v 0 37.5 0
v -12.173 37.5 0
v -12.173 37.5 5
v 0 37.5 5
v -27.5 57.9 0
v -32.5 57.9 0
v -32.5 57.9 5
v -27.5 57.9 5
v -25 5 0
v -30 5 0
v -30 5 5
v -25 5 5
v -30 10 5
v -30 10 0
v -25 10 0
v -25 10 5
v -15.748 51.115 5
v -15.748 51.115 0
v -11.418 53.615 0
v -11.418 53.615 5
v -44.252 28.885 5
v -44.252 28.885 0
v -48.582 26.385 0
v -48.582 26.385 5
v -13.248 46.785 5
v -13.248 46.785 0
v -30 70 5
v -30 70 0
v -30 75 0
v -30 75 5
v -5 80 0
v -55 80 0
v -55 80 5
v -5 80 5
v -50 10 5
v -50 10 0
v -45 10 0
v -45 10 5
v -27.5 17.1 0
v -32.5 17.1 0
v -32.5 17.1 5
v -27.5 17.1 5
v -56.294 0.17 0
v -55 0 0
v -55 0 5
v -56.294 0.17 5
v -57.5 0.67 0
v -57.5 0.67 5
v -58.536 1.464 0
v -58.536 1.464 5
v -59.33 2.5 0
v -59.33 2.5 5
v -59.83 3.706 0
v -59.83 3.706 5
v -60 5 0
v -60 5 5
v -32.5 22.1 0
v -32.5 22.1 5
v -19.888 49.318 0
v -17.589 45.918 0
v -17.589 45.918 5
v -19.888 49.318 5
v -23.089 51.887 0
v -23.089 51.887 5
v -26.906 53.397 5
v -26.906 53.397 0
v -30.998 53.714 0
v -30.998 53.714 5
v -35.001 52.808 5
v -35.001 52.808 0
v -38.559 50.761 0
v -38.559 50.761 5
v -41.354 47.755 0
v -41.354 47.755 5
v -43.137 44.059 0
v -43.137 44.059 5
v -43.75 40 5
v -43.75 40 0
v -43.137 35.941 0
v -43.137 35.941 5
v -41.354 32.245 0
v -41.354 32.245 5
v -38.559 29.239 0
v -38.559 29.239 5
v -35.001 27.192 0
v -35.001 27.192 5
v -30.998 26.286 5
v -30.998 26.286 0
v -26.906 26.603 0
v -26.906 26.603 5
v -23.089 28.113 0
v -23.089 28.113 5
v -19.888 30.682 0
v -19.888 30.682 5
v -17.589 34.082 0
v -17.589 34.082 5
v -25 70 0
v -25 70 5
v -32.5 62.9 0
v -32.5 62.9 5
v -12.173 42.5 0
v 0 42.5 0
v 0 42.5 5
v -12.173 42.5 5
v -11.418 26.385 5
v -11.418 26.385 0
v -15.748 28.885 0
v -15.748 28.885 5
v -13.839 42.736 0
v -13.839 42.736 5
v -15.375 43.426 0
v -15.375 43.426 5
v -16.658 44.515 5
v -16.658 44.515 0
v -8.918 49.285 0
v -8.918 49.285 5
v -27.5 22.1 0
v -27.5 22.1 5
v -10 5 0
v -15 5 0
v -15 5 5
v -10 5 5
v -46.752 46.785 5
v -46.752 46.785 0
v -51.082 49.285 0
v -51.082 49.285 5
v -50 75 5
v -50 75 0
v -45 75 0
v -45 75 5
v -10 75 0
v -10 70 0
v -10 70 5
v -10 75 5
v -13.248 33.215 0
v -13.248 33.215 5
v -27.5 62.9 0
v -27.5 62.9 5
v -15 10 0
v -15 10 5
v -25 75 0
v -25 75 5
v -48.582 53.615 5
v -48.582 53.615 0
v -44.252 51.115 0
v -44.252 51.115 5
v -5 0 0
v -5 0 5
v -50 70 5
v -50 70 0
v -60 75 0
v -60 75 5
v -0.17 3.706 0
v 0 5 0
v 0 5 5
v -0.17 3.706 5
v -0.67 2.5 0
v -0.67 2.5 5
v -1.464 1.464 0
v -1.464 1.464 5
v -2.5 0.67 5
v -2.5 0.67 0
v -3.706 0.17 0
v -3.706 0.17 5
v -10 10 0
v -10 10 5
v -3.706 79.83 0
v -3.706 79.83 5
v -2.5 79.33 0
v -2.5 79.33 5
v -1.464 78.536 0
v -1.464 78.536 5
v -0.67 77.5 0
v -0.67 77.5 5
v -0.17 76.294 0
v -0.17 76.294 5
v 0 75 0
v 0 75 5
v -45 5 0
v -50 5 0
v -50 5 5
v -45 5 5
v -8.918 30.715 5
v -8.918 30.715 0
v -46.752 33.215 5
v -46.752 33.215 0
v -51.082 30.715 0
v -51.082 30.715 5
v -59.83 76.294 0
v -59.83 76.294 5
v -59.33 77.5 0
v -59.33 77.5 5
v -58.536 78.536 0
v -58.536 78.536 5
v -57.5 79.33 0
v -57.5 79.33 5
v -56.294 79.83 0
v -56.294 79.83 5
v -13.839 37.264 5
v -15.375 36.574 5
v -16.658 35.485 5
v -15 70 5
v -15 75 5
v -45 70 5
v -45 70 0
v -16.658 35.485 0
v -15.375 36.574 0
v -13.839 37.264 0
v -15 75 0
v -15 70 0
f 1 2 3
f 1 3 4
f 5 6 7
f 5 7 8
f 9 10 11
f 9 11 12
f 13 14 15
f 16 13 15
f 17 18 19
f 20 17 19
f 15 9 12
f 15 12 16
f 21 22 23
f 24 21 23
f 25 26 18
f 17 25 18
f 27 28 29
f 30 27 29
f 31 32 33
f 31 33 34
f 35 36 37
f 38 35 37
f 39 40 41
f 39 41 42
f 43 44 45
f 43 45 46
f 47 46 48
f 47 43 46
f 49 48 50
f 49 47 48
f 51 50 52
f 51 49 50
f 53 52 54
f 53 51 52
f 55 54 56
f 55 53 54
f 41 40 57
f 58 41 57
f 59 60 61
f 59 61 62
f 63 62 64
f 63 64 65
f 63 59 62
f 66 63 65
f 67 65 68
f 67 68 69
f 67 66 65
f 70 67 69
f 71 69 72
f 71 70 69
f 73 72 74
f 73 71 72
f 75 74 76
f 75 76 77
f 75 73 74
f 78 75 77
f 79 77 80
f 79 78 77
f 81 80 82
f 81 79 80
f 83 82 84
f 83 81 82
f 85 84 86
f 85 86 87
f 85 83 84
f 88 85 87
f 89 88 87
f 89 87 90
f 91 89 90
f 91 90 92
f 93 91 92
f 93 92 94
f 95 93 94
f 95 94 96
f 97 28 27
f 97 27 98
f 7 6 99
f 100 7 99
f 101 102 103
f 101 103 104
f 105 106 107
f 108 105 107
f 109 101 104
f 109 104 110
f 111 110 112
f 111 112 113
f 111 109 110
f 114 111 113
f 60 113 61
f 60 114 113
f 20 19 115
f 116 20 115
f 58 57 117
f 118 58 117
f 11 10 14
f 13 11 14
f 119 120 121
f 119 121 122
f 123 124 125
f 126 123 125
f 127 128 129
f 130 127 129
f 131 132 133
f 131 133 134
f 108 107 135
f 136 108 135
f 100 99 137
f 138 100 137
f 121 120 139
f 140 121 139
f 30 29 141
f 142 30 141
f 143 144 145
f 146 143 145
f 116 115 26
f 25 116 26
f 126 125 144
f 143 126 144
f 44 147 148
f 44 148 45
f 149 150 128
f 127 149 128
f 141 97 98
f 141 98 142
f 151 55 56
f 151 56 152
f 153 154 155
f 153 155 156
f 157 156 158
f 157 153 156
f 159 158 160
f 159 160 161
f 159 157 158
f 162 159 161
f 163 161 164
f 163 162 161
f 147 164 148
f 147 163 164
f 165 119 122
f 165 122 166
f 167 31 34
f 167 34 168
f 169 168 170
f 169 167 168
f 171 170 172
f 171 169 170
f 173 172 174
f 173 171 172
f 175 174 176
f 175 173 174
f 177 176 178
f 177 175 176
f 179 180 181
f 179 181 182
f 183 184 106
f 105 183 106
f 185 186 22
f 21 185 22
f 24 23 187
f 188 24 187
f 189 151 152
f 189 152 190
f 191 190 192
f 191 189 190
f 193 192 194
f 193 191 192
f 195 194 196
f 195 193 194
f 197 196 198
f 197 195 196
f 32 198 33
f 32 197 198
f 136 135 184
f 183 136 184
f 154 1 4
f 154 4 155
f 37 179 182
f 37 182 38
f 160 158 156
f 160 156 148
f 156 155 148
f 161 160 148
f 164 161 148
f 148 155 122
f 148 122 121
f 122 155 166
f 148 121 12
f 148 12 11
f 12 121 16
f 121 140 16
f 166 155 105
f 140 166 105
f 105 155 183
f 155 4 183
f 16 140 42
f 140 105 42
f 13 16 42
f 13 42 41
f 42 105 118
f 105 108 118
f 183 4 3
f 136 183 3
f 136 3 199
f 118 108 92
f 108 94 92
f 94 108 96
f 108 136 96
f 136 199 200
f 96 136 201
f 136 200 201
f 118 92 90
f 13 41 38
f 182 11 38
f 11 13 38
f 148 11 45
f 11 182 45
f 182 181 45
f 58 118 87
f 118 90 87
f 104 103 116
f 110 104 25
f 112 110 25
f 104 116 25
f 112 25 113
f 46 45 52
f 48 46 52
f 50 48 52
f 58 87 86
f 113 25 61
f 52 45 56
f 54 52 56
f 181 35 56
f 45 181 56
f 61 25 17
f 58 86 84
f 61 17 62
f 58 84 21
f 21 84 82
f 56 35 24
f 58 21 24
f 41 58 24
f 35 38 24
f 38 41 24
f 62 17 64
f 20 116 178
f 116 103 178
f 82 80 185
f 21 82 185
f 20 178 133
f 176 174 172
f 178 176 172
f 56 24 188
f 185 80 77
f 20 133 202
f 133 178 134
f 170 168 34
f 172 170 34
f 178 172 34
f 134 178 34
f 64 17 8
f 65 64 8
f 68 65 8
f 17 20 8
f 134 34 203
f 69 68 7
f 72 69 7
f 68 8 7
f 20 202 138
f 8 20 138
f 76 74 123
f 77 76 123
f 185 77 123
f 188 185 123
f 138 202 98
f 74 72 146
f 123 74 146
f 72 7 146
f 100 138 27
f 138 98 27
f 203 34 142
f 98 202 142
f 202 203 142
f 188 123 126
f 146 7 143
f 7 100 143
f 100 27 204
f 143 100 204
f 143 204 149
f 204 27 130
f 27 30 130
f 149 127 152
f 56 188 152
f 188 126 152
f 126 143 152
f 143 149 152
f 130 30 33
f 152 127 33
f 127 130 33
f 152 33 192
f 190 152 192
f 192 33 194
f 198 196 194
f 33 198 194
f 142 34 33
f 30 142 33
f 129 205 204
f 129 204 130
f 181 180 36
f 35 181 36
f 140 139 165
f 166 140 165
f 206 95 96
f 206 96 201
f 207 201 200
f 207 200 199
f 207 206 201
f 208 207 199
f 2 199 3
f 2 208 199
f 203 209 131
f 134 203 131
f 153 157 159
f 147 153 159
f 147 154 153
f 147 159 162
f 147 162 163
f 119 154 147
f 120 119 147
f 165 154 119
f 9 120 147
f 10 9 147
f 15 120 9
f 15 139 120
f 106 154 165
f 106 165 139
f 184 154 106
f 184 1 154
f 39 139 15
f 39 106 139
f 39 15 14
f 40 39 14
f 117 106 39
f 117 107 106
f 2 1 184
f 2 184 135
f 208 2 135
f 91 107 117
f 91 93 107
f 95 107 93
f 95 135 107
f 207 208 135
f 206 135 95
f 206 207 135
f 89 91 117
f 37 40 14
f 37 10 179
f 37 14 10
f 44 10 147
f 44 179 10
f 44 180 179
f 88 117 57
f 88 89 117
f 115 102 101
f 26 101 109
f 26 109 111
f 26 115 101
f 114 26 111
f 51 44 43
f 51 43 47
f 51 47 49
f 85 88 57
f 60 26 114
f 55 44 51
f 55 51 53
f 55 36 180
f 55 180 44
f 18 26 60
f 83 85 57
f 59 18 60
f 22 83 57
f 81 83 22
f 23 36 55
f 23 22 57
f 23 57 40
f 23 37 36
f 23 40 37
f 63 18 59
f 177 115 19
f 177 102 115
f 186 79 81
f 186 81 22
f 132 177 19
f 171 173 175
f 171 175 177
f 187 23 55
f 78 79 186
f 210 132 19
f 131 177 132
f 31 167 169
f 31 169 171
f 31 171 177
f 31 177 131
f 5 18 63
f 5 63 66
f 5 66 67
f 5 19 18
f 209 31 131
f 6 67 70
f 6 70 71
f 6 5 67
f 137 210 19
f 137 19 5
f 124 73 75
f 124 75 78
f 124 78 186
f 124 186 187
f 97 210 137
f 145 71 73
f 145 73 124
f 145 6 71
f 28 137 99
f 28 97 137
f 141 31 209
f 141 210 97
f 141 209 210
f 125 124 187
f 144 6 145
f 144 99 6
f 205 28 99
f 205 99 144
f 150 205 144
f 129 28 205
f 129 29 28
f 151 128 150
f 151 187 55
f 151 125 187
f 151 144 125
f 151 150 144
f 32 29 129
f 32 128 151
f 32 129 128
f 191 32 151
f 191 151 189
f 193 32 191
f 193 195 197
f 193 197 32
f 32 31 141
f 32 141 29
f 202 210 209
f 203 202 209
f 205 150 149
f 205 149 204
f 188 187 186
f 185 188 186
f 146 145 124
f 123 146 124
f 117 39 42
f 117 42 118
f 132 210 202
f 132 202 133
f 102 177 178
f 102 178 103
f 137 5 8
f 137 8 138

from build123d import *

# Parameters (mm, degrees)
ESQUISSE1_W        = 5
ESQUISSE1_H        = 5
BOSS_EXTRU_1_DEPTH = 5


with BuildPart() as part:
    # Esquisse1 → Boss.-Extru.1 (new body)
    with BuildSketch(Plane.XY):
        with BuildLine():
            Line((-55, 80), (-5, 80))
            ThreePointArc((-5, 80), (-1.464466094, 78.535533906), (0, 75))
            Line((0, 75), (0, 42.5))
            Line((0, 42.5), (-12.172703514, 42.5))
            ThreePointArc((-12.172703514, 42.5), (-15.374759815, 43.42586604), (-17.588591054, 45.917721519))
            ThreePointArc((-17.588591054, 45.917721519), (-43.75, 40), (-17.588591054, 34.082278481))
            ThreePointArc((-17.588591054, 34.082278481), (-15.374759815, 36.57413396), (-12.172703514, 37.5))
            Line((-12.172703514, 37.5), (0, 37.5))
            Line((0, 37.5), (0, 5))
            ThreePointArc((0, 5), (-1.464466094, 1.464466094), (-5, 0))
            Line((-5, 0), (-55, 0))
            ThreePointArc((-55, 0), (-58.535533906, 1.464466094), (-60, 5))
            Line((-60, 5), (-60, 75))
            ThreePointArc((-60, 75), (-58.535533906, 78.535533906), (-55, 80))
        make_face()
        with Locations((-12.5, 72.5)):
            Rectangle(ESQUISSE1_W, ESQUISSE1_H, mode=Mode.SUBTRACT)
        with Locations((-47.5, 7.5)):
            Rectangle(ESQUISSE1_W, ESQUISSE1_H, mode=Mode.SUBTRACT)
        with Locations((-27.5, 7.5)):
            Rectangle(ESQUISSE1_W, ESQUISSE1_H, mode=Mode.SUBTRACT)
        with Locations((-12.5, 7.5)):
            Rectangle(ESQUISSE1_W, ESQUISSE1_H, mode=Mode.SUBTRACT)
        with Locations((-27.5, 72.5)):
            Rectangle(ESQUISSE1_W, ESQUISSE1_H, mode=Mode.SUBTRACT)
        with Locations((-47.5, 72.5)):
            Rectangle(ESQUISSE1_W, ESQUISSE1_H, mode=Mode.SUBTRACT)
        with Locations((-30, 60.4)):
            Rectangle(ESQUISSE1_W, ESQUISSE1_H, mode=Mode.SUBTRACT)
        Polygon((-11.418018253, 53.615063509), (-8.918018253, 49.284936491), (-13.248145272, 46.784936491), (-15.748145272, 51.115063509), align=None, mode=Mode.SUBTRACT)
        Polygon((-8.918018253, 30.715063509), (-11.418018253, 26.384936491), (-15.748145272, 28.884936491), (-13.248145272, 33.215063509), align=None, mode=Mode.SUBTRACT)
        with Locations((-30, 19.6)):
            Rectangle(ESQUISSE1_W, ESQUISSE1_H, mode=Mode.SUBTRACT)
        Polygon((-48.581981747, 26.384936491), (-51.081981747, 30.715063509), (-46.751854728, 33.215063509), (-44.251854728, 28.884936491), align=None, mode=Mode.SUBTRACT)
        Polygon((-51.081981747, 49.284936491), (-48.581981747, 53.615063509), (-44.251854728, 51.115063509), (-46.751854728, 46.784936491), align=None, mode=Mode.SUBTRACT)
    extrude(amount=BOSS_EXTRU_1_DEPTH)


solid = part.part
